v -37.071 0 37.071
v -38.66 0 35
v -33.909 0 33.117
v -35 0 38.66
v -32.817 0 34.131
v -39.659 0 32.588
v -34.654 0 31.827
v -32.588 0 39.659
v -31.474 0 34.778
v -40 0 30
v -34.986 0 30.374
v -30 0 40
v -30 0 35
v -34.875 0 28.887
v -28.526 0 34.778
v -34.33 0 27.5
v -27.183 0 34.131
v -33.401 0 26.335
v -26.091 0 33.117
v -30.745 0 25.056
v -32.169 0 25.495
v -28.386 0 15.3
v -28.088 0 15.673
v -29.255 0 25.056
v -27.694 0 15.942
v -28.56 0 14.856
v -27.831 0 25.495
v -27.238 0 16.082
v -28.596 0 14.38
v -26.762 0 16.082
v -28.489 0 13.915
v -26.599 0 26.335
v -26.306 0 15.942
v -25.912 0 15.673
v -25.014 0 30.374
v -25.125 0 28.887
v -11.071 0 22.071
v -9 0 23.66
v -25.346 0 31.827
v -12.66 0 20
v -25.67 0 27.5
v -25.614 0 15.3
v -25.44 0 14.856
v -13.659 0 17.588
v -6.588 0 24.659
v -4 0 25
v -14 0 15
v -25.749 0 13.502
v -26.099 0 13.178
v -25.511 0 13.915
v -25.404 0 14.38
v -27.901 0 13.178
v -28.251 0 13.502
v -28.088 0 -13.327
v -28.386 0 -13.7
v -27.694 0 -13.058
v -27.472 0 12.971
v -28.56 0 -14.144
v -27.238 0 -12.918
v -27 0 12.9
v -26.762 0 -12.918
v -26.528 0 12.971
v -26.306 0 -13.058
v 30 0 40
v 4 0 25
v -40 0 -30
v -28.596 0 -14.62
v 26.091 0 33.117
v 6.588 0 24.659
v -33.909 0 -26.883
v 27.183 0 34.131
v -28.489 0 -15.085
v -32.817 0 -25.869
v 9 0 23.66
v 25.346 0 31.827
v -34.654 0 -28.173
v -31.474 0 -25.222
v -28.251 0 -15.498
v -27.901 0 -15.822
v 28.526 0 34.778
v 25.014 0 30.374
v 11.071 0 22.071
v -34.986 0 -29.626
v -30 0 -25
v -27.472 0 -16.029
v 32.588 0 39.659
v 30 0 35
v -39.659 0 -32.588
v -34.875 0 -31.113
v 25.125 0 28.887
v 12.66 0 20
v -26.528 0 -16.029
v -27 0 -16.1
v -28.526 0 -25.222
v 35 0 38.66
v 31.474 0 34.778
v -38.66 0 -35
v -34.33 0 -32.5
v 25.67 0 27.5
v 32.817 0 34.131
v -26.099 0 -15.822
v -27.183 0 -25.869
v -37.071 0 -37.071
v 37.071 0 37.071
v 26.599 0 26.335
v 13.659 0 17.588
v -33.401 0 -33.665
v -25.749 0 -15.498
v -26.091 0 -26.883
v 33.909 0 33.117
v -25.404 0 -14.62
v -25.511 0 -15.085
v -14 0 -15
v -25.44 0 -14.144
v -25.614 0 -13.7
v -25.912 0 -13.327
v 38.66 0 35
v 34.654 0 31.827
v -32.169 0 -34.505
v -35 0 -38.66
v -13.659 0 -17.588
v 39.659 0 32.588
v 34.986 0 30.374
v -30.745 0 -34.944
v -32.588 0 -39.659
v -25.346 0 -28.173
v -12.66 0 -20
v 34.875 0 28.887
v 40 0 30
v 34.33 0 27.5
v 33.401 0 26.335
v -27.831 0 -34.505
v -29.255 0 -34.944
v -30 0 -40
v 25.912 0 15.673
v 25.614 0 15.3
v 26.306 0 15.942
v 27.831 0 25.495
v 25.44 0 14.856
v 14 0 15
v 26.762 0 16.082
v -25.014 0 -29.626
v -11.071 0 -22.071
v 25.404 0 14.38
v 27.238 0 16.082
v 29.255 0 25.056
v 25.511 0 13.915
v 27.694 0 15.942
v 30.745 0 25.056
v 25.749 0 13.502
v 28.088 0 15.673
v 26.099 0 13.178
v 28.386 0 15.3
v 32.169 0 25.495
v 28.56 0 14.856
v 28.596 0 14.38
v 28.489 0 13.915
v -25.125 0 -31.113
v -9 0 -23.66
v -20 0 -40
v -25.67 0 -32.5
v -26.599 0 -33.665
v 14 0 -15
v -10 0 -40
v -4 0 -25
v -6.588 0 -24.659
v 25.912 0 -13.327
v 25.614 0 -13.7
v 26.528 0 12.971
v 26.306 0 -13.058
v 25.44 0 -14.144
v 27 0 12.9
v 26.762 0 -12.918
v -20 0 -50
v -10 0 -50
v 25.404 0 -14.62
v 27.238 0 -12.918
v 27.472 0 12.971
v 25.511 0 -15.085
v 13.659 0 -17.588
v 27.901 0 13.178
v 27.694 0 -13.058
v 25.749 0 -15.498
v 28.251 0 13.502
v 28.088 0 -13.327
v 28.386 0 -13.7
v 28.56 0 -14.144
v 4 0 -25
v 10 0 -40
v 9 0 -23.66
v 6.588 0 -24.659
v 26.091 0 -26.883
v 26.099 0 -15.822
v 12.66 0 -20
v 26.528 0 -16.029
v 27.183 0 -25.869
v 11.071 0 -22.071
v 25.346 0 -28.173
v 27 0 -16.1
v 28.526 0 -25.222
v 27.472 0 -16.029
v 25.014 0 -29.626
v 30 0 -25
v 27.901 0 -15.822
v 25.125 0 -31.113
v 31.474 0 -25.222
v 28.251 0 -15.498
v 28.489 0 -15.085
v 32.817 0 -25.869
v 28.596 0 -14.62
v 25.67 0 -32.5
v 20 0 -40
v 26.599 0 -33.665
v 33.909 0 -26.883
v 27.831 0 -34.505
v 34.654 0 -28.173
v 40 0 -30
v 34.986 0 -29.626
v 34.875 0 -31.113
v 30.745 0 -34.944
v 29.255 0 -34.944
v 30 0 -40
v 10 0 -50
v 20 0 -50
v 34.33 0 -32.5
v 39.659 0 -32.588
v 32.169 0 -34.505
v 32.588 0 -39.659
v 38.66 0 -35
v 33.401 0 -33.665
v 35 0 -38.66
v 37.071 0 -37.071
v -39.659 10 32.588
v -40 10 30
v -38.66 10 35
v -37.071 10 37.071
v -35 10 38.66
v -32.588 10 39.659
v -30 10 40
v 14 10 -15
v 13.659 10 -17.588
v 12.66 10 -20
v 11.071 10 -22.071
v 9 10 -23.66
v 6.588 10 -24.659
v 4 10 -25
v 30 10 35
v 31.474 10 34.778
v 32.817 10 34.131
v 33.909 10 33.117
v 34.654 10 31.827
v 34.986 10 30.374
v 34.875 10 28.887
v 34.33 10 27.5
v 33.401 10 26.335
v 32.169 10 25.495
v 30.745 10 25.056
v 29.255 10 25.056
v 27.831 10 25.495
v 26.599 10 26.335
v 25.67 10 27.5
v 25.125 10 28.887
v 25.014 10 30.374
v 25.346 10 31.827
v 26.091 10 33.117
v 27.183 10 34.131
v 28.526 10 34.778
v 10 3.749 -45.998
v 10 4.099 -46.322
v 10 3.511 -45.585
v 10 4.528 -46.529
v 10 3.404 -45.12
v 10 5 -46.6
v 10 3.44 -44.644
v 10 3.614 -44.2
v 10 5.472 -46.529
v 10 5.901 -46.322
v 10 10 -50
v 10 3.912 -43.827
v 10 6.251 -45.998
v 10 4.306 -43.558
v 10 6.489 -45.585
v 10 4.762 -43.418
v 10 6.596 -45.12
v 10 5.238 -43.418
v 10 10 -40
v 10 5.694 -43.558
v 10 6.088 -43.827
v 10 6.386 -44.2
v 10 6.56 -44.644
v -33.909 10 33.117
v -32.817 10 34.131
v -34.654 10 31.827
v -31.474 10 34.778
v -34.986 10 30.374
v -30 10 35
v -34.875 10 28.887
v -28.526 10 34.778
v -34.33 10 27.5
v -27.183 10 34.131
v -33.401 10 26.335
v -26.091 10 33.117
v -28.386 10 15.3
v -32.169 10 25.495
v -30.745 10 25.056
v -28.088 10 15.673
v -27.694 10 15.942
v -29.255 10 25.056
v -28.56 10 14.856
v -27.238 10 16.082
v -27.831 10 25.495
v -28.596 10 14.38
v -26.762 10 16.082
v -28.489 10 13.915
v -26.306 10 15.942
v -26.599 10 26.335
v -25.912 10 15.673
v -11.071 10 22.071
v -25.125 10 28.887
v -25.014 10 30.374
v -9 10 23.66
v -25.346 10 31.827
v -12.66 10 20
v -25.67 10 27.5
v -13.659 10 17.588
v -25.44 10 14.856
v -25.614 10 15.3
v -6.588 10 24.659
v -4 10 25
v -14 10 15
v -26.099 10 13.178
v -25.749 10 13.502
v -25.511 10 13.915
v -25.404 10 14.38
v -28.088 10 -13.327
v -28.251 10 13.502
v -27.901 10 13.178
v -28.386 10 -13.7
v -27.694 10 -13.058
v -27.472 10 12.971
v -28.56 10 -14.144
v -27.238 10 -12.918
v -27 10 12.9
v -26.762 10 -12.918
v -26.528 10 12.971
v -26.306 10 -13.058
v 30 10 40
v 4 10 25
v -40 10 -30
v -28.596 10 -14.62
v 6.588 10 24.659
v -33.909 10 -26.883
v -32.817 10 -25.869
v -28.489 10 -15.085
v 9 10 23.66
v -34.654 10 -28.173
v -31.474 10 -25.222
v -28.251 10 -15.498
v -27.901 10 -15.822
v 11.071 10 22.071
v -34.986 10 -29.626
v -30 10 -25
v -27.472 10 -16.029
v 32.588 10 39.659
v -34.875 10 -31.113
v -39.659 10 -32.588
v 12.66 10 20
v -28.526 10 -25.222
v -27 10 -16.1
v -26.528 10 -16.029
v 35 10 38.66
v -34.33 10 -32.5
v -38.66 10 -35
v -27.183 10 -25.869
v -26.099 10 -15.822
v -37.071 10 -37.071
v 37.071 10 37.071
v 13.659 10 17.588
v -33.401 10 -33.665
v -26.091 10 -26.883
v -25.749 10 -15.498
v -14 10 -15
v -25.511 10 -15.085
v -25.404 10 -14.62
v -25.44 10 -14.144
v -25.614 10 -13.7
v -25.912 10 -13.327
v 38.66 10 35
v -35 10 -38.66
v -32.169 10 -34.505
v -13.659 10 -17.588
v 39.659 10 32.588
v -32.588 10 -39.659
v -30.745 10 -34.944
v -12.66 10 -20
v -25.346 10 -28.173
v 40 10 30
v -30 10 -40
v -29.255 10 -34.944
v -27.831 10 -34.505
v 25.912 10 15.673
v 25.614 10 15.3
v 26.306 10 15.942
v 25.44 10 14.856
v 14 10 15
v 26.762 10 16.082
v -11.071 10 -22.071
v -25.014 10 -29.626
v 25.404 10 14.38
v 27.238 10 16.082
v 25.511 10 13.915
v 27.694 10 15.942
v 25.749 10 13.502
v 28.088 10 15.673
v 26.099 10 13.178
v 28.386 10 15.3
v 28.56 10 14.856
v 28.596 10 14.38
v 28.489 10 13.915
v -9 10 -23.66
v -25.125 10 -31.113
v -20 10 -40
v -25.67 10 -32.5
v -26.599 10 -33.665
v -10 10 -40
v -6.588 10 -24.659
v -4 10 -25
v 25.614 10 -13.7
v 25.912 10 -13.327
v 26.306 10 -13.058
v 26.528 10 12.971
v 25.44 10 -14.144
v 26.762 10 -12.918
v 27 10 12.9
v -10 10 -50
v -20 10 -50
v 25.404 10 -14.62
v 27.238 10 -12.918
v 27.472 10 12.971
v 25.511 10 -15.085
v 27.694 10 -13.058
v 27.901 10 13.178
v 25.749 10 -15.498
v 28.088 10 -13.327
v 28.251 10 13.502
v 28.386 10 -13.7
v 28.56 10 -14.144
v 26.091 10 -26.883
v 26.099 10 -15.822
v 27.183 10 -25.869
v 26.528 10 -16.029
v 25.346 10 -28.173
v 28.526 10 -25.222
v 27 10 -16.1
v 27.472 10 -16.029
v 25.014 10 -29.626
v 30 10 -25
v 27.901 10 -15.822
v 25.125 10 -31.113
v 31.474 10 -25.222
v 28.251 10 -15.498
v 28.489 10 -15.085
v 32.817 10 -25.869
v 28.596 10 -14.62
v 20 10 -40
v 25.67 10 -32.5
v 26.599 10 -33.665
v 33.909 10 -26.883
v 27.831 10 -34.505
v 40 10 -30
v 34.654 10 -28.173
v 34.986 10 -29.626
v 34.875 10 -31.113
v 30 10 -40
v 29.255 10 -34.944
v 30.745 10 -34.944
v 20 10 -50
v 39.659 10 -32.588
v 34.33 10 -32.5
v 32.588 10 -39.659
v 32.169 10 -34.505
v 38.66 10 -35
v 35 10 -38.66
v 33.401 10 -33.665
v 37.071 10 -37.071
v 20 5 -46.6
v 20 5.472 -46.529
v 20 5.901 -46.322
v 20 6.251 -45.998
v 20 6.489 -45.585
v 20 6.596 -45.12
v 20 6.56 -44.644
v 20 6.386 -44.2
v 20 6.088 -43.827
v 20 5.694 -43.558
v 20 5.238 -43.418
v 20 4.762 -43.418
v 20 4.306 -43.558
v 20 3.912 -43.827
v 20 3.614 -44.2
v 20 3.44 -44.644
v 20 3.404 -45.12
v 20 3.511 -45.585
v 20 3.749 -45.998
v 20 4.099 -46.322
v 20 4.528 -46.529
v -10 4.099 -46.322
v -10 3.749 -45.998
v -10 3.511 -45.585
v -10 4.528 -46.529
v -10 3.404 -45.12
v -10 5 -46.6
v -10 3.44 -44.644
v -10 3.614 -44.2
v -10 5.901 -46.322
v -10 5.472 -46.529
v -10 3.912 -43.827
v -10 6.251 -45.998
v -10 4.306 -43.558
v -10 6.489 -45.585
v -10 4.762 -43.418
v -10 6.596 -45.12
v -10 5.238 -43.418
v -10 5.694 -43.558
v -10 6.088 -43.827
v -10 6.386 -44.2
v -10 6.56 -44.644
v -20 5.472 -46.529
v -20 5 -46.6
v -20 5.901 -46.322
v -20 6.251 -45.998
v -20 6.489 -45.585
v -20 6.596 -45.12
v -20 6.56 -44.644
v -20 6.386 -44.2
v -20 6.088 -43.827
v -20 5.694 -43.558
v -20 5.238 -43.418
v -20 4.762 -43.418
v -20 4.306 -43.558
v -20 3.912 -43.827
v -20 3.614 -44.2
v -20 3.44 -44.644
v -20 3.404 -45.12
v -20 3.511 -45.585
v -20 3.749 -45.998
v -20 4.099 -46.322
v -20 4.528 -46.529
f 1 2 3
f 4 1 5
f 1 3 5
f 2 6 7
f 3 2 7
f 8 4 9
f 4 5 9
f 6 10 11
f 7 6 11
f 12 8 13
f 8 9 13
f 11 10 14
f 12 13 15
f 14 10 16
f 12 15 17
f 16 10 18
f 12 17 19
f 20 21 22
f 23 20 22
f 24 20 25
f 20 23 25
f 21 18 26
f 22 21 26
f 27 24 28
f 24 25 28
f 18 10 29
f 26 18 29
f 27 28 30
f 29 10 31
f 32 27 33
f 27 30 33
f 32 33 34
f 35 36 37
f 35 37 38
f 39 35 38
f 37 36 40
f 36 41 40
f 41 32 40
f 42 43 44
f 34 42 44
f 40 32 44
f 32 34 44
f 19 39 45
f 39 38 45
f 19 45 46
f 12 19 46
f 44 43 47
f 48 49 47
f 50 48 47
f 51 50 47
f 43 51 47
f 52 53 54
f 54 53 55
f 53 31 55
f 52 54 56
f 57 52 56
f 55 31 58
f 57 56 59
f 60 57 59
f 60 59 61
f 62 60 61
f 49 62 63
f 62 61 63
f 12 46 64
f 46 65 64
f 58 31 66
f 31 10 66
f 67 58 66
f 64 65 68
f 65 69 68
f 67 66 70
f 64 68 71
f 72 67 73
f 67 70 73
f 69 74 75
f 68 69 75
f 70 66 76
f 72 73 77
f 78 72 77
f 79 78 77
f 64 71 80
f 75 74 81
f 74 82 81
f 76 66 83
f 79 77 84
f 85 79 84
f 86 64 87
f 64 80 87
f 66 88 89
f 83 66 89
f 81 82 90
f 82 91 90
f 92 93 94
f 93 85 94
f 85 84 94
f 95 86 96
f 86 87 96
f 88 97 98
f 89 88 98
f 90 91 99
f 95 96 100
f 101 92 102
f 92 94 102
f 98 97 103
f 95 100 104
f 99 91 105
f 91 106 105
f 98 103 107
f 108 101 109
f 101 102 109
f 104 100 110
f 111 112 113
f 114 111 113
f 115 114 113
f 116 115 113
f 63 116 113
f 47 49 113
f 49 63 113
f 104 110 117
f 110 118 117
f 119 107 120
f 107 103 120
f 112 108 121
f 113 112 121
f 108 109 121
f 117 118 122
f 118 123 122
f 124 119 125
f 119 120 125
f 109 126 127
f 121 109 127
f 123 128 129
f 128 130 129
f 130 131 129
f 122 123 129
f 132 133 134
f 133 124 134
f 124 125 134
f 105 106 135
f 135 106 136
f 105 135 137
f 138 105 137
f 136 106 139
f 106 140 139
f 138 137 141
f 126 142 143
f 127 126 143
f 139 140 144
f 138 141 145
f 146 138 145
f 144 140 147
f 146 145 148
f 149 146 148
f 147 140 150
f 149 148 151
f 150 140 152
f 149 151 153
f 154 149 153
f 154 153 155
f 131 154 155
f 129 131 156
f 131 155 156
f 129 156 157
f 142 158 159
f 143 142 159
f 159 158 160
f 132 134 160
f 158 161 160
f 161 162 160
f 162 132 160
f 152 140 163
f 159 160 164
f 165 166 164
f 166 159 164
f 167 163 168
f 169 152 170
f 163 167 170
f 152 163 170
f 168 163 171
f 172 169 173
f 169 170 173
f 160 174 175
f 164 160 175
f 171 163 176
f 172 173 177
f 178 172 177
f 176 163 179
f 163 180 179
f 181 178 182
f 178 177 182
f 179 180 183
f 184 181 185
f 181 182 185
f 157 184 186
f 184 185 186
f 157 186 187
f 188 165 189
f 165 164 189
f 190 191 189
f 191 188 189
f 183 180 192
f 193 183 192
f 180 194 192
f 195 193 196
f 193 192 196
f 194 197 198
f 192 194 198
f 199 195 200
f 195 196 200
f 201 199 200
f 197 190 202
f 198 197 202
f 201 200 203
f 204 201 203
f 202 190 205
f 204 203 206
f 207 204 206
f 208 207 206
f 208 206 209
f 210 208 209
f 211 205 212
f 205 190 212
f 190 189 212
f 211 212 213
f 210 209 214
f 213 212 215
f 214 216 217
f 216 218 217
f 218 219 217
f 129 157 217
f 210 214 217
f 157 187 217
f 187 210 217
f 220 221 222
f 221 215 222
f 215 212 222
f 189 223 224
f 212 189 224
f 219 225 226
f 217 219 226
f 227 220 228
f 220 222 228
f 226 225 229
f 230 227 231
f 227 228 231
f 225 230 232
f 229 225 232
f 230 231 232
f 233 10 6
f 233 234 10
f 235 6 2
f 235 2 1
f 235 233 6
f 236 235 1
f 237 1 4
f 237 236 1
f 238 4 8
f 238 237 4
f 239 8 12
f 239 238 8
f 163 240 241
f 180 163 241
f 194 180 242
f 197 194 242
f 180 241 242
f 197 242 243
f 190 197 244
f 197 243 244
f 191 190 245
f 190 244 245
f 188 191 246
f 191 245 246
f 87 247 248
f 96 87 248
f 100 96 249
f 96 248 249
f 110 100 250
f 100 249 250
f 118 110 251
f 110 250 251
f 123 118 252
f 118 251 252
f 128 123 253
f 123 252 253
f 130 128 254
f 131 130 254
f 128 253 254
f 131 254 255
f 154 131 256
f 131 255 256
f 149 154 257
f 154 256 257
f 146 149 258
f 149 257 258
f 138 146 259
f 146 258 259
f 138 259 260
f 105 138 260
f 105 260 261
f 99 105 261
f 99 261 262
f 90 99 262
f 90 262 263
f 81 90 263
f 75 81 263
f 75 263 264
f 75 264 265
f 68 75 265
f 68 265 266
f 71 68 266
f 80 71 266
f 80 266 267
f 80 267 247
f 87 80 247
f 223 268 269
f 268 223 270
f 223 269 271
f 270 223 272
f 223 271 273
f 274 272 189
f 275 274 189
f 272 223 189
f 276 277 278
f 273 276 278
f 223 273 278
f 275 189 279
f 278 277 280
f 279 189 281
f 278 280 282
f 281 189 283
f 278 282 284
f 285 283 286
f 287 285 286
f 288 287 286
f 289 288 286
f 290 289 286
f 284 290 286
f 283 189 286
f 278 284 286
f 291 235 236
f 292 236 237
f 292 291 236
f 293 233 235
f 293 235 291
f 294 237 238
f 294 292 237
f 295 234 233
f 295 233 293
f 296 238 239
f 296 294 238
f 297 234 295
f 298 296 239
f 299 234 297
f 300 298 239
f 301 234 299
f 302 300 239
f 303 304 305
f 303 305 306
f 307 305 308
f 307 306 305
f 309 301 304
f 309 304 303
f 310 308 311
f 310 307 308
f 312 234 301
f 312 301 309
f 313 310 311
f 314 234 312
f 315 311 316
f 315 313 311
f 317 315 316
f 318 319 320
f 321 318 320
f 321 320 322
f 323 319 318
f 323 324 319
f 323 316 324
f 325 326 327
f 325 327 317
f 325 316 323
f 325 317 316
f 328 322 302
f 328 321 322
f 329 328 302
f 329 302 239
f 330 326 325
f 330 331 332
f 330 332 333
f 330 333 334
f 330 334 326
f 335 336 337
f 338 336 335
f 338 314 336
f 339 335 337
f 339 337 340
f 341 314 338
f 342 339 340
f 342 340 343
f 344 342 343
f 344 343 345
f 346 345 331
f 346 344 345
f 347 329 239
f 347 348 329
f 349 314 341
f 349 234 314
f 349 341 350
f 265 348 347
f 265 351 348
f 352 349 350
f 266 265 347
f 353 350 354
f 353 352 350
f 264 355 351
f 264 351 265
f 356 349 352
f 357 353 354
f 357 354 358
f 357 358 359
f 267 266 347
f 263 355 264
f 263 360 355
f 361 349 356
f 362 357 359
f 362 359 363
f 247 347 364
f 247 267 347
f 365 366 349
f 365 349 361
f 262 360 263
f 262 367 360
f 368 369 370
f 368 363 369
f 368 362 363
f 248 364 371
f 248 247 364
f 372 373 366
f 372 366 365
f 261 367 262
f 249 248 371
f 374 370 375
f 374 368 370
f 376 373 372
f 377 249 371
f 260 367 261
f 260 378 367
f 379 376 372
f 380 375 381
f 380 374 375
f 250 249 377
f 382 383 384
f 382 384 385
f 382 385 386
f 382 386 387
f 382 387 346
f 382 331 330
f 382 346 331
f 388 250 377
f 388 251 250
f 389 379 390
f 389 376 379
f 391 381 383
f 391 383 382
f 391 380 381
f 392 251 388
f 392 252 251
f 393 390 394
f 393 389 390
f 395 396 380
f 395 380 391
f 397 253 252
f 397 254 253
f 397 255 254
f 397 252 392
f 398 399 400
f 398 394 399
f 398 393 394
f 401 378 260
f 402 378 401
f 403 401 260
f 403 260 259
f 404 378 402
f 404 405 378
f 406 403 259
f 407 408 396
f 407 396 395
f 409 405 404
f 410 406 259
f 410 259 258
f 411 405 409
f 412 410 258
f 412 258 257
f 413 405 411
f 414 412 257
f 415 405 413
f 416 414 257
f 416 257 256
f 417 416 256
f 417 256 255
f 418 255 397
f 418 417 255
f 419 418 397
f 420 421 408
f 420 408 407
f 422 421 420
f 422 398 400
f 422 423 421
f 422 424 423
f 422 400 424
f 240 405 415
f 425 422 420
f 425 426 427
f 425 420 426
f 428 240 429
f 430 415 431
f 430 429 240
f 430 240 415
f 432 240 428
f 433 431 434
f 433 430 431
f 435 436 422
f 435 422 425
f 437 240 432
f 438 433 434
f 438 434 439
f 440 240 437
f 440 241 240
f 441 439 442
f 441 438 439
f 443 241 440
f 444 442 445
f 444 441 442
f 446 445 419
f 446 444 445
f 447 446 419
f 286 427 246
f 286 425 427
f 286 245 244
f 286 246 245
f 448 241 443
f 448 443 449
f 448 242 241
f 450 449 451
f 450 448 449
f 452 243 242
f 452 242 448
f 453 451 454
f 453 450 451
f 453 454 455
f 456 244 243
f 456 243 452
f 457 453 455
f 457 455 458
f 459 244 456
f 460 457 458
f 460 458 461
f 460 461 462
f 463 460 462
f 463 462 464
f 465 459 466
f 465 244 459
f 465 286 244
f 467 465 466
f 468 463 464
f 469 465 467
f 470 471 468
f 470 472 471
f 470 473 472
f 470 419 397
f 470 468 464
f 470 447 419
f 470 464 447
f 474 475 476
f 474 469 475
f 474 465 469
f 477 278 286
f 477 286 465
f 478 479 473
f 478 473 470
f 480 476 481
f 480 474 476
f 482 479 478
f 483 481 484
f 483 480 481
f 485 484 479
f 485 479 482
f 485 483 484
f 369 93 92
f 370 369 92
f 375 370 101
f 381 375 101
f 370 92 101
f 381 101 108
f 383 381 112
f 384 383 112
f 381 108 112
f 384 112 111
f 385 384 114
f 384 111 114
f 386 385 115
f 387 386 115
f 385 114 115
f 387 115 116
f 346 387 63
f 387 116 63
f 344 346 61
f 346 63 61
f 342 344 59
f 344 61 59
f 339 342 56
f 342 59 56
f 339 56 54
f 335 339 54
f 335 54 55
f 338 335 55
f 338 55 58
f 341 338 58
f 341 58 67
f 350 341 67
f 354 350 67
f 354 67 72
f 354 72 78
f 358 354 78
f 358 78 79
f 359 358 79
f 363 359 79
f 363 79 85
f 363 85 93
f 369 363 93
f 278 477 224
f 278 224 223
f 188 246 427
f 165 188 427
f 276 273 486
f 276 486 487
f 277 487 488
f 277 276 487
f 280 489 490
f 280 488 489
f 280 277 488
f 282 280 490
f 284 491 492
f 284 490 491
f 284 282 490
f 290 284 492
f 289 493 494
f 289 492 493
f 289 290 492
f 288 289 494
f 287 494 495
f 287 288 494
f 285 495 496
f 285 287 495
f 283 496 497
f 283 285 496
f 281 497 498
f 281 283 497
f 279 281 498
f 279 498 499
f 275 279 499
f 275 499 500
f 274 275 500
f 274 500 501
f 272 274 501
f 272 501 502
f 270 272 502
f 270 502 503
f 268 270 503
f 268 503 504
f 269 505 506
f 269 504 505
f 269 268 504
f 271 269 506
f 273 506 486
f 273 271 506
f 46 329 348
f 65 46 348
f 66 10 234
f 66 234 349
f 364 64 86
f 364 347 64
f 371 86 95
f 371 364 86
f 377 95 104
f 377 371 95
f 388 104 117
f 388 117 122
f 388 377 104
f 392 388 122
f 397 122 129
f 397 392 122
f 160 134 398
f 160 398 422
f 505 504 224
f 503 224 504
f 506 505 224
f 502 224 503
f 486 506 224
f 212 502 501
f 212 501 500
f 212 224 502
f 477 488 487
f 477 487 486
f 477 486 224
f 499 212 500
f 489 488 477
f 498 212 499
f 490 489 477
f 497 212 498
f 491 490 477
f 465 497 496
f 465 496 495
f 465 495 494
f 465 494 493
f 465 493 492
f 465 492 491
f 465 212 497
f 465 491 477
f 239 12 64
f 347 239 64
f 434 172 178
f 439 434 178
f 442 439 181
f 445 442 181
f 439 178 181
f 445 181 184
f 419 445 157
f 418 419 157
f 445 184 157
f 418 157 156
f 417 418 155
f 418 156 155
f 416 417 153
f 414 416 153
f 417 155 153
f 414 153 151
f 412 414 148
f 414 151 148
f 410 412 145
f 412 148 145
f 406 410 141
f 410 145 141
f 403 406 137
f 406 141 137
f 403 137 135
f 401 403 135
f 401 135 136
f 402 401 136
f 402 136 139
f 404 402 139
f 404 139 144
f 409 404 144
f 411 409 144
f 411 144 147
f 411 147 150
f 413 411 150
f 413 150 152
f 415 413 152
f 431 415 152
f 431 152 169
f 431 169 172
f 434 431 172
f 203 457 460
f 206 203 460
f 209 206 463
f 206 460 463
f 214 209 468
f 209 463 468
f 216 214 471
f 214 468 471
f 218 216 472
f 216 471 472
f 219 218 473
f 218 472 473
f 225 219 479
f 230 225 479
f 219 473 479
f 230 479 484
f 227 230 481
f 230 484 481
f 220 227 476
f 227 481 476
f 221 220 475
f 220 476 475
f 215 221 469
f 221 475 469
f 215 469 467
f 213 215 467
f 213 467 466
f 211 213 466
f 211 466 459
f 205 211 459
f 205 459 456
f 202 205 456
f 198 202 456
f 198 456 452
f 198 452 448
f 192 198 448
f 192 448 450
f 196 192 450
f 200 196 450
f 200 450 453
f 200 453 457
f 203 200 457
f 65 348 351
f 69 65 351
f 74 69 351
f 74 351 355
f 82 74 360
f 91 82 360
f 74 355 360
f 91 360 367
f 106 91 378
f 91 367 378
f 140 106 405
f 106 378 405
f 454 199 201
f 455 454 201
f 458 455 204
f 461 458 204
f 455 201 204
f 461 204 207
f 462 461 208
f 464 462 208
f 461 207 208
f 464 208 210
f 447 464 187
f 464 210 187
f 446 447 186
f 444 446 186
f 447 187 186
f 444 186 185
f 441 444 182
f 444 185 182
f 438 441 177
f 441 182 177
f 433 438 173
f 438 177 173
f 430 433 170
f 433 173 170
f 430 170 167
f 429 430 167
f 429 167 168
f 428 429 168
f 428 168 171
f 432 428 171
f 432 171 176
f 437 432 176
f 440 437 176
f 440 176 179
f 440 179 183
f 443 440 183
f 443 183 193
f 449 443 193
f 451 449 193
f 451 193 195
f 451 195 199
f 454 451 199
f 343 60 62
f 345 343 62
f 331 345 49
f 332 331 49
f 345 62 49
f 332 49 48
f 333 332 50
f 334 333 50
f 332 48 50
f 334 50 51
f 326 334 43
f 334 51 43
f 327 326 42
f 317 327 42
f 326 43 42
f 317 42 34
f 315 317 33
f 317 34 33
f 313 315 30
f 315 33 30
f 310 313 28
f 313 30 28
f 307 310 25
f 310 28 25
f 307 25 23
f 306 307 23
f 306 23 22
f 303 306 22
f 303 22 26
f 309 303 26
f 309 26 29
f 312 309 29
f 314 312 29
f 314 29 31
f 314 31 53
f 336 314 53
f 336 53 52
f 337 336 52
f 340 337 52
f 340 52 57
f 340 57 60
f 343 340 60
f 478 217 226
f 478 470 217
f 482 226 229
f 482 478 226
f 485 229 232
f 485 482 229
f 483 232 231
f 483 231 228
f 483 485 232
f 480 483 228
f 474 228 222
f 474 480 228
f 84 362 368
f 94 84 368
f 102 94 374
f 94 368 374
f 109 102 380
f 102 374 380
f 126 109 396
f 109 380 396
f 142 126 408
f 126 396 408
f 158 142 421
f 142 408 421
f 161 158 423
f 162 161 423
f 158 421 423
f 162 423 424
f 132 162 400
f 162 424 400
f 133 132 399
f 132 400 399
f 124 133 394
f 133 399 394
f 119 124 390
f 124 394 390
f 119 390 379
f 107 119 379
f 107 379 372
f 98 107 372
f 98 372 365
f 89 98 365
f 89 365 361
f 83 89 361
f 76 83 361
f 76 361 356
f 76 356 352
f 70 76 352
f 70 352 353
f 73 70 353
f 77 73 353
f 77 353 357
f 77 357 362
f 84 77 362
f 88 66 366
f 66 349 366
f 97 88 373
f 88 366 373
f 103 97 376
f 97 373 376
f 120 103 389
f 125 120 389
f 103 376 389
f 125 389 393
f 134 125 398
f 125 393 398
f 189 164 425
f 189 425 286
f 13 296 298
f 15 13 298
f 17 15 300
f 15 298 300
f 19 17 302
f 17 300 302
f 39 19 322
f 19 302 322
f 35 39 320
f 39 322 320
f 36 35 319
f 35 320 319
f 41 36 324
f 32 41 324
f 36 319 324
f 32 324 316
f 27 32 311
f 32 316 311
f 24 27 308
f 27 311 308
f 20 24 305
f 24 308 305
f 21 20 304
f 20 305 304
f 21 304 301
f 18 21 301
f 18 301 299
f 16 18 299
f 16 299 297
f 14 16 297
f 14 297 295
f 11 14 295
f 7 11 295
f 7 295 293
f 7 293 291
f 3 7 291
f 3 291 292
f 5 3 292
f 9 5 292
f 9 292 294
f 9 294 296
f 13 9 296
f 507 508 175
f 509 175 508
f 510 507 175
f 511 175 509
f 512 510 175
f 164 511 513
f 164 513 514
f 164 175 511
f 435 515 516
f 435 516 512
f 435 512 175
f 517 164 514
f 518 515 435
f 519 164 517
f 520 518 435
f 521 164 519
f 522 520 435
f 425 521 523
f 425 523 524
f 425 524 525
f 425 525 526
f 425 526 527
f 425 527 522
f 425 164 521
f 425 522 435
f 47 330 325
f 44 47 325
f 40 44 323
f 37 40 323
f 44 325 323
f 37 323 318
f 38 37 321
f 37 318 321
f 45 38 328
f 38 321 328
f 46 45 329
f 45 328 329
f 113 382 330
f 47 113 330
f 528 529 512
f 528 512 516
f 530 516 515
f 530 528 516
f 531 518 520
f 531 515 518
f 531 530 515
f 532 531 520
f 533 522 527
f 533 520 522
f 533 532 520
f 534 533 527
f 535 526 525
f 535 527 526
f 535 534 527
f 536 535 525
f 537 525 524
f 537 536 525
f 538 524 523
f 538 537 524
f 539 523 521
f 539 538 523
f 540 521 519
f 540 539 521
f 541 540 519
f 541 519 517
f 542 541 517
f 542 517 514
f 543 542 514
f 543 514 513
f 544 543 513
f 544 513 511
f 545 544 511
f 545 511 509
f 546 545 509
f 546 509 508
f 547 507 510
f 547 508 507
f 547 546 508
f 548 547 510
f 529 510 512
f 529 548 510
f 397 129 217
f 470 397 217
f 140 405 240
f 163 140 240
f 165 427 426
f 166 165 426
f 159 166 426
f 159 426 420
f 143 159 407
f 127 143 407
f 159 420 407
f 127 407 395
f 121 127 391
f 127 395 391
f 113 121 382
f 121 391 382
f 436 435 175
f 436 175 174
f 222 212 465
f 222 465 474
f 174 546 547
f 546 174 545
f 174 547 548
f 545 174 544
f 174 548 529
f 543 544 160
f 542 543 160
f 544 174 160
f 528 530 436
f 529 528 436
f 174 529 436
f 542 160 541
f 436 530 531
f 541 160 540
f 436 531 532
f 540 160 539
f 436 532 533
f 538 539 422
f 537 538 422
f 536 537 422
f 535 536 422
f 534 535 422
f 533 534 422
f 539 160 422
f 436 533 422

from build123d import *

# Parameters (mm, degrees)
SKETCH_1_W               = 80
SKETCH_1_H               = 80
EXTRUDE_1_DEPTH          = 10
FILLET_1_R               = 10
CUT_EXTRUDE_2_DEPTH      = 58.445626465
SKETCH_4_R               = 5
CUT_EXTRUDE_5_DEPTH      = 58.445626465
SKETCH_5_R               = 1.6
CUT_EXTRUDE_3_DEPTH      = 58.445626465
SKETCH_6_W               = 10
SKETCH_6_H               = 10
EXTRUDE_3_DEPTH          = 10
CUT_EXTRUDE_4_DEPTH      = 65.807406984
CUT_EXTRUDE_4_DEPTH_BACK = 65.807406984
SKETCH_7_R               = 1.6


with BuildPart() as part:
    # ｽｹｯﾁ1 → ﾎﾞｽ - 押し出し1 (new body)
    with BuildSketch(Plane(origin=(0, 0, 0), x_dir=(1, 0, 0), z_dir=(0, 1, 0))):
        Rectangle(SKETCH_1_W, SKETCH_1_H)
    extrude(amount=EXTRUDE_1_DEPTH)

    # ﾌｨﾚｯﾄ1
    fillet_1_edges = [part.edges().sort_by_distance(p)[0] for p in [
        (40, 5, 40),
        (-40, 5, 40),
        (-40, 5, -40),
        (40, 5, -40),
    ]]
    fillet(fillet_1_edges, radius=FILLET_1_R)

    # ｽｹｯﾁ3 → ｶｯﾄ - 押し出し2 (cut, through all)
    with BuildSketch(Plane(origin=(0, 10, 0), x_dir=(1, 0, 0), z_dir=(0, 1, 0))):
        with BuildLine():
            Line((-4, -25), (4, -25))
            ThreePointArc((4, -25), (11.071067812, -22.071067812), (14, -15))
            Line((14, -15), (14, 15))
            ThreePointArc((14, 15), (11.071067812, 22.071067812), (4, 25))
            Line((4, 25), (-4, 25))
            ThreePointArc((-4, 25), (-11.071067812, 22.071067812), (-14, 15))
            Line((-14, 15), (-14, -15))
            ThreePointArc((-14, -15), (-11.071067812, -22.071067812), (-4, -25))
        make_face()
    extrude(amount=-CUT_EXTRUDE_2_DEPTH, mode=Mode.SUBTRACT)

    # ｽｹｯﾁ4 → ｶｯﾄ - 押し出し5 (cut, through all)
    with BuildSketch(Plane(origin=(0, 10, 0), x_dir=(1, 0, 0), z_dir=(0, 1, 0))):
        with Locations(Location((-30, 30, 0), (0, 0, 270))):
            Circle(SKETCH_4_R)
        with Locations(Location((30, 30, 0), (0, 0, 270))):
            Circle(SKETCH_4_R)
        with Locations(Location((-30, -30, 0), (0, 0, 270))):
            Circle(SKETCH_4_R)
        with Locations(Location((30, -30, 0), (0, 0, 270))):
            Circle(SKETCH_4_R)
    extrude(amount=-CUT_EXTRUDE_5_DEPTH, mode=Mode.SUBTRACT)

    # ｽｹｯﾁ5 → ｶｯﾄ - 押し出し3 (cut, through all)
    with BuildSketch(Plane.XZ):
        with Locations(Location((27, 14.5, 0), (0, 0, 270))):
            Circle(SKETCH_5_R)
        with Locations(Location((-27, 14.5, 0), (0, 0, 270))):
            Circle(SKETCH_5_R)
        with Locations(Location((-27, -14.5, 0), (0, 0, 270))):
            Circle(SKETCH_5_R)
        with Locations(Location((27, -14.5, 0), (0, 0, 270))):
            Circle(SKETCH_5_R)
    extrude(amount=-CUT_EXTRUDE_3_DEPTH, mode=Mode.SUBTRACT)

    # ｽｹｯﾁ6 → ﾎﾞｽ - 押し出し3 (add)
    with BuildSketch(Plane(origin=(0, 0, -40), x_dir=(-1, 0, 0), z_dir=(0, 0, -1))):
        with Locations((-15, 5)):
            Rectangle(SKETCH_6_W, SKETCH_6_H)
        with Locations((15, 5)):
            Rectangle(SKETCH_6_W, SKETCH_6_H)
    extrude(amount=EXTRUDE_3_DEPTH)

    # ｽｹｯﾁ7 → ｶｯﾄ - 押し出し4 (cut, two sides: drawn at the far end of the back side and taken through both)
    with BuildSketch(Plane(origin=(0, 0, 0), x_dir=(0, 0, -1), z_dir=(1, 0, 0)).offset(-CUT_EXTRUDE_4_DEPTH_BACK)):
        with Locations((45, 5)):
            Circle(SKETCH_7_R)
    extrude(amount=CUT_EXTRUDE_4_DEPTH + CUT_EXTRUDE_4_DEPTH_BACK, mode=Mode.SUBTRACT)


solid = part.part
